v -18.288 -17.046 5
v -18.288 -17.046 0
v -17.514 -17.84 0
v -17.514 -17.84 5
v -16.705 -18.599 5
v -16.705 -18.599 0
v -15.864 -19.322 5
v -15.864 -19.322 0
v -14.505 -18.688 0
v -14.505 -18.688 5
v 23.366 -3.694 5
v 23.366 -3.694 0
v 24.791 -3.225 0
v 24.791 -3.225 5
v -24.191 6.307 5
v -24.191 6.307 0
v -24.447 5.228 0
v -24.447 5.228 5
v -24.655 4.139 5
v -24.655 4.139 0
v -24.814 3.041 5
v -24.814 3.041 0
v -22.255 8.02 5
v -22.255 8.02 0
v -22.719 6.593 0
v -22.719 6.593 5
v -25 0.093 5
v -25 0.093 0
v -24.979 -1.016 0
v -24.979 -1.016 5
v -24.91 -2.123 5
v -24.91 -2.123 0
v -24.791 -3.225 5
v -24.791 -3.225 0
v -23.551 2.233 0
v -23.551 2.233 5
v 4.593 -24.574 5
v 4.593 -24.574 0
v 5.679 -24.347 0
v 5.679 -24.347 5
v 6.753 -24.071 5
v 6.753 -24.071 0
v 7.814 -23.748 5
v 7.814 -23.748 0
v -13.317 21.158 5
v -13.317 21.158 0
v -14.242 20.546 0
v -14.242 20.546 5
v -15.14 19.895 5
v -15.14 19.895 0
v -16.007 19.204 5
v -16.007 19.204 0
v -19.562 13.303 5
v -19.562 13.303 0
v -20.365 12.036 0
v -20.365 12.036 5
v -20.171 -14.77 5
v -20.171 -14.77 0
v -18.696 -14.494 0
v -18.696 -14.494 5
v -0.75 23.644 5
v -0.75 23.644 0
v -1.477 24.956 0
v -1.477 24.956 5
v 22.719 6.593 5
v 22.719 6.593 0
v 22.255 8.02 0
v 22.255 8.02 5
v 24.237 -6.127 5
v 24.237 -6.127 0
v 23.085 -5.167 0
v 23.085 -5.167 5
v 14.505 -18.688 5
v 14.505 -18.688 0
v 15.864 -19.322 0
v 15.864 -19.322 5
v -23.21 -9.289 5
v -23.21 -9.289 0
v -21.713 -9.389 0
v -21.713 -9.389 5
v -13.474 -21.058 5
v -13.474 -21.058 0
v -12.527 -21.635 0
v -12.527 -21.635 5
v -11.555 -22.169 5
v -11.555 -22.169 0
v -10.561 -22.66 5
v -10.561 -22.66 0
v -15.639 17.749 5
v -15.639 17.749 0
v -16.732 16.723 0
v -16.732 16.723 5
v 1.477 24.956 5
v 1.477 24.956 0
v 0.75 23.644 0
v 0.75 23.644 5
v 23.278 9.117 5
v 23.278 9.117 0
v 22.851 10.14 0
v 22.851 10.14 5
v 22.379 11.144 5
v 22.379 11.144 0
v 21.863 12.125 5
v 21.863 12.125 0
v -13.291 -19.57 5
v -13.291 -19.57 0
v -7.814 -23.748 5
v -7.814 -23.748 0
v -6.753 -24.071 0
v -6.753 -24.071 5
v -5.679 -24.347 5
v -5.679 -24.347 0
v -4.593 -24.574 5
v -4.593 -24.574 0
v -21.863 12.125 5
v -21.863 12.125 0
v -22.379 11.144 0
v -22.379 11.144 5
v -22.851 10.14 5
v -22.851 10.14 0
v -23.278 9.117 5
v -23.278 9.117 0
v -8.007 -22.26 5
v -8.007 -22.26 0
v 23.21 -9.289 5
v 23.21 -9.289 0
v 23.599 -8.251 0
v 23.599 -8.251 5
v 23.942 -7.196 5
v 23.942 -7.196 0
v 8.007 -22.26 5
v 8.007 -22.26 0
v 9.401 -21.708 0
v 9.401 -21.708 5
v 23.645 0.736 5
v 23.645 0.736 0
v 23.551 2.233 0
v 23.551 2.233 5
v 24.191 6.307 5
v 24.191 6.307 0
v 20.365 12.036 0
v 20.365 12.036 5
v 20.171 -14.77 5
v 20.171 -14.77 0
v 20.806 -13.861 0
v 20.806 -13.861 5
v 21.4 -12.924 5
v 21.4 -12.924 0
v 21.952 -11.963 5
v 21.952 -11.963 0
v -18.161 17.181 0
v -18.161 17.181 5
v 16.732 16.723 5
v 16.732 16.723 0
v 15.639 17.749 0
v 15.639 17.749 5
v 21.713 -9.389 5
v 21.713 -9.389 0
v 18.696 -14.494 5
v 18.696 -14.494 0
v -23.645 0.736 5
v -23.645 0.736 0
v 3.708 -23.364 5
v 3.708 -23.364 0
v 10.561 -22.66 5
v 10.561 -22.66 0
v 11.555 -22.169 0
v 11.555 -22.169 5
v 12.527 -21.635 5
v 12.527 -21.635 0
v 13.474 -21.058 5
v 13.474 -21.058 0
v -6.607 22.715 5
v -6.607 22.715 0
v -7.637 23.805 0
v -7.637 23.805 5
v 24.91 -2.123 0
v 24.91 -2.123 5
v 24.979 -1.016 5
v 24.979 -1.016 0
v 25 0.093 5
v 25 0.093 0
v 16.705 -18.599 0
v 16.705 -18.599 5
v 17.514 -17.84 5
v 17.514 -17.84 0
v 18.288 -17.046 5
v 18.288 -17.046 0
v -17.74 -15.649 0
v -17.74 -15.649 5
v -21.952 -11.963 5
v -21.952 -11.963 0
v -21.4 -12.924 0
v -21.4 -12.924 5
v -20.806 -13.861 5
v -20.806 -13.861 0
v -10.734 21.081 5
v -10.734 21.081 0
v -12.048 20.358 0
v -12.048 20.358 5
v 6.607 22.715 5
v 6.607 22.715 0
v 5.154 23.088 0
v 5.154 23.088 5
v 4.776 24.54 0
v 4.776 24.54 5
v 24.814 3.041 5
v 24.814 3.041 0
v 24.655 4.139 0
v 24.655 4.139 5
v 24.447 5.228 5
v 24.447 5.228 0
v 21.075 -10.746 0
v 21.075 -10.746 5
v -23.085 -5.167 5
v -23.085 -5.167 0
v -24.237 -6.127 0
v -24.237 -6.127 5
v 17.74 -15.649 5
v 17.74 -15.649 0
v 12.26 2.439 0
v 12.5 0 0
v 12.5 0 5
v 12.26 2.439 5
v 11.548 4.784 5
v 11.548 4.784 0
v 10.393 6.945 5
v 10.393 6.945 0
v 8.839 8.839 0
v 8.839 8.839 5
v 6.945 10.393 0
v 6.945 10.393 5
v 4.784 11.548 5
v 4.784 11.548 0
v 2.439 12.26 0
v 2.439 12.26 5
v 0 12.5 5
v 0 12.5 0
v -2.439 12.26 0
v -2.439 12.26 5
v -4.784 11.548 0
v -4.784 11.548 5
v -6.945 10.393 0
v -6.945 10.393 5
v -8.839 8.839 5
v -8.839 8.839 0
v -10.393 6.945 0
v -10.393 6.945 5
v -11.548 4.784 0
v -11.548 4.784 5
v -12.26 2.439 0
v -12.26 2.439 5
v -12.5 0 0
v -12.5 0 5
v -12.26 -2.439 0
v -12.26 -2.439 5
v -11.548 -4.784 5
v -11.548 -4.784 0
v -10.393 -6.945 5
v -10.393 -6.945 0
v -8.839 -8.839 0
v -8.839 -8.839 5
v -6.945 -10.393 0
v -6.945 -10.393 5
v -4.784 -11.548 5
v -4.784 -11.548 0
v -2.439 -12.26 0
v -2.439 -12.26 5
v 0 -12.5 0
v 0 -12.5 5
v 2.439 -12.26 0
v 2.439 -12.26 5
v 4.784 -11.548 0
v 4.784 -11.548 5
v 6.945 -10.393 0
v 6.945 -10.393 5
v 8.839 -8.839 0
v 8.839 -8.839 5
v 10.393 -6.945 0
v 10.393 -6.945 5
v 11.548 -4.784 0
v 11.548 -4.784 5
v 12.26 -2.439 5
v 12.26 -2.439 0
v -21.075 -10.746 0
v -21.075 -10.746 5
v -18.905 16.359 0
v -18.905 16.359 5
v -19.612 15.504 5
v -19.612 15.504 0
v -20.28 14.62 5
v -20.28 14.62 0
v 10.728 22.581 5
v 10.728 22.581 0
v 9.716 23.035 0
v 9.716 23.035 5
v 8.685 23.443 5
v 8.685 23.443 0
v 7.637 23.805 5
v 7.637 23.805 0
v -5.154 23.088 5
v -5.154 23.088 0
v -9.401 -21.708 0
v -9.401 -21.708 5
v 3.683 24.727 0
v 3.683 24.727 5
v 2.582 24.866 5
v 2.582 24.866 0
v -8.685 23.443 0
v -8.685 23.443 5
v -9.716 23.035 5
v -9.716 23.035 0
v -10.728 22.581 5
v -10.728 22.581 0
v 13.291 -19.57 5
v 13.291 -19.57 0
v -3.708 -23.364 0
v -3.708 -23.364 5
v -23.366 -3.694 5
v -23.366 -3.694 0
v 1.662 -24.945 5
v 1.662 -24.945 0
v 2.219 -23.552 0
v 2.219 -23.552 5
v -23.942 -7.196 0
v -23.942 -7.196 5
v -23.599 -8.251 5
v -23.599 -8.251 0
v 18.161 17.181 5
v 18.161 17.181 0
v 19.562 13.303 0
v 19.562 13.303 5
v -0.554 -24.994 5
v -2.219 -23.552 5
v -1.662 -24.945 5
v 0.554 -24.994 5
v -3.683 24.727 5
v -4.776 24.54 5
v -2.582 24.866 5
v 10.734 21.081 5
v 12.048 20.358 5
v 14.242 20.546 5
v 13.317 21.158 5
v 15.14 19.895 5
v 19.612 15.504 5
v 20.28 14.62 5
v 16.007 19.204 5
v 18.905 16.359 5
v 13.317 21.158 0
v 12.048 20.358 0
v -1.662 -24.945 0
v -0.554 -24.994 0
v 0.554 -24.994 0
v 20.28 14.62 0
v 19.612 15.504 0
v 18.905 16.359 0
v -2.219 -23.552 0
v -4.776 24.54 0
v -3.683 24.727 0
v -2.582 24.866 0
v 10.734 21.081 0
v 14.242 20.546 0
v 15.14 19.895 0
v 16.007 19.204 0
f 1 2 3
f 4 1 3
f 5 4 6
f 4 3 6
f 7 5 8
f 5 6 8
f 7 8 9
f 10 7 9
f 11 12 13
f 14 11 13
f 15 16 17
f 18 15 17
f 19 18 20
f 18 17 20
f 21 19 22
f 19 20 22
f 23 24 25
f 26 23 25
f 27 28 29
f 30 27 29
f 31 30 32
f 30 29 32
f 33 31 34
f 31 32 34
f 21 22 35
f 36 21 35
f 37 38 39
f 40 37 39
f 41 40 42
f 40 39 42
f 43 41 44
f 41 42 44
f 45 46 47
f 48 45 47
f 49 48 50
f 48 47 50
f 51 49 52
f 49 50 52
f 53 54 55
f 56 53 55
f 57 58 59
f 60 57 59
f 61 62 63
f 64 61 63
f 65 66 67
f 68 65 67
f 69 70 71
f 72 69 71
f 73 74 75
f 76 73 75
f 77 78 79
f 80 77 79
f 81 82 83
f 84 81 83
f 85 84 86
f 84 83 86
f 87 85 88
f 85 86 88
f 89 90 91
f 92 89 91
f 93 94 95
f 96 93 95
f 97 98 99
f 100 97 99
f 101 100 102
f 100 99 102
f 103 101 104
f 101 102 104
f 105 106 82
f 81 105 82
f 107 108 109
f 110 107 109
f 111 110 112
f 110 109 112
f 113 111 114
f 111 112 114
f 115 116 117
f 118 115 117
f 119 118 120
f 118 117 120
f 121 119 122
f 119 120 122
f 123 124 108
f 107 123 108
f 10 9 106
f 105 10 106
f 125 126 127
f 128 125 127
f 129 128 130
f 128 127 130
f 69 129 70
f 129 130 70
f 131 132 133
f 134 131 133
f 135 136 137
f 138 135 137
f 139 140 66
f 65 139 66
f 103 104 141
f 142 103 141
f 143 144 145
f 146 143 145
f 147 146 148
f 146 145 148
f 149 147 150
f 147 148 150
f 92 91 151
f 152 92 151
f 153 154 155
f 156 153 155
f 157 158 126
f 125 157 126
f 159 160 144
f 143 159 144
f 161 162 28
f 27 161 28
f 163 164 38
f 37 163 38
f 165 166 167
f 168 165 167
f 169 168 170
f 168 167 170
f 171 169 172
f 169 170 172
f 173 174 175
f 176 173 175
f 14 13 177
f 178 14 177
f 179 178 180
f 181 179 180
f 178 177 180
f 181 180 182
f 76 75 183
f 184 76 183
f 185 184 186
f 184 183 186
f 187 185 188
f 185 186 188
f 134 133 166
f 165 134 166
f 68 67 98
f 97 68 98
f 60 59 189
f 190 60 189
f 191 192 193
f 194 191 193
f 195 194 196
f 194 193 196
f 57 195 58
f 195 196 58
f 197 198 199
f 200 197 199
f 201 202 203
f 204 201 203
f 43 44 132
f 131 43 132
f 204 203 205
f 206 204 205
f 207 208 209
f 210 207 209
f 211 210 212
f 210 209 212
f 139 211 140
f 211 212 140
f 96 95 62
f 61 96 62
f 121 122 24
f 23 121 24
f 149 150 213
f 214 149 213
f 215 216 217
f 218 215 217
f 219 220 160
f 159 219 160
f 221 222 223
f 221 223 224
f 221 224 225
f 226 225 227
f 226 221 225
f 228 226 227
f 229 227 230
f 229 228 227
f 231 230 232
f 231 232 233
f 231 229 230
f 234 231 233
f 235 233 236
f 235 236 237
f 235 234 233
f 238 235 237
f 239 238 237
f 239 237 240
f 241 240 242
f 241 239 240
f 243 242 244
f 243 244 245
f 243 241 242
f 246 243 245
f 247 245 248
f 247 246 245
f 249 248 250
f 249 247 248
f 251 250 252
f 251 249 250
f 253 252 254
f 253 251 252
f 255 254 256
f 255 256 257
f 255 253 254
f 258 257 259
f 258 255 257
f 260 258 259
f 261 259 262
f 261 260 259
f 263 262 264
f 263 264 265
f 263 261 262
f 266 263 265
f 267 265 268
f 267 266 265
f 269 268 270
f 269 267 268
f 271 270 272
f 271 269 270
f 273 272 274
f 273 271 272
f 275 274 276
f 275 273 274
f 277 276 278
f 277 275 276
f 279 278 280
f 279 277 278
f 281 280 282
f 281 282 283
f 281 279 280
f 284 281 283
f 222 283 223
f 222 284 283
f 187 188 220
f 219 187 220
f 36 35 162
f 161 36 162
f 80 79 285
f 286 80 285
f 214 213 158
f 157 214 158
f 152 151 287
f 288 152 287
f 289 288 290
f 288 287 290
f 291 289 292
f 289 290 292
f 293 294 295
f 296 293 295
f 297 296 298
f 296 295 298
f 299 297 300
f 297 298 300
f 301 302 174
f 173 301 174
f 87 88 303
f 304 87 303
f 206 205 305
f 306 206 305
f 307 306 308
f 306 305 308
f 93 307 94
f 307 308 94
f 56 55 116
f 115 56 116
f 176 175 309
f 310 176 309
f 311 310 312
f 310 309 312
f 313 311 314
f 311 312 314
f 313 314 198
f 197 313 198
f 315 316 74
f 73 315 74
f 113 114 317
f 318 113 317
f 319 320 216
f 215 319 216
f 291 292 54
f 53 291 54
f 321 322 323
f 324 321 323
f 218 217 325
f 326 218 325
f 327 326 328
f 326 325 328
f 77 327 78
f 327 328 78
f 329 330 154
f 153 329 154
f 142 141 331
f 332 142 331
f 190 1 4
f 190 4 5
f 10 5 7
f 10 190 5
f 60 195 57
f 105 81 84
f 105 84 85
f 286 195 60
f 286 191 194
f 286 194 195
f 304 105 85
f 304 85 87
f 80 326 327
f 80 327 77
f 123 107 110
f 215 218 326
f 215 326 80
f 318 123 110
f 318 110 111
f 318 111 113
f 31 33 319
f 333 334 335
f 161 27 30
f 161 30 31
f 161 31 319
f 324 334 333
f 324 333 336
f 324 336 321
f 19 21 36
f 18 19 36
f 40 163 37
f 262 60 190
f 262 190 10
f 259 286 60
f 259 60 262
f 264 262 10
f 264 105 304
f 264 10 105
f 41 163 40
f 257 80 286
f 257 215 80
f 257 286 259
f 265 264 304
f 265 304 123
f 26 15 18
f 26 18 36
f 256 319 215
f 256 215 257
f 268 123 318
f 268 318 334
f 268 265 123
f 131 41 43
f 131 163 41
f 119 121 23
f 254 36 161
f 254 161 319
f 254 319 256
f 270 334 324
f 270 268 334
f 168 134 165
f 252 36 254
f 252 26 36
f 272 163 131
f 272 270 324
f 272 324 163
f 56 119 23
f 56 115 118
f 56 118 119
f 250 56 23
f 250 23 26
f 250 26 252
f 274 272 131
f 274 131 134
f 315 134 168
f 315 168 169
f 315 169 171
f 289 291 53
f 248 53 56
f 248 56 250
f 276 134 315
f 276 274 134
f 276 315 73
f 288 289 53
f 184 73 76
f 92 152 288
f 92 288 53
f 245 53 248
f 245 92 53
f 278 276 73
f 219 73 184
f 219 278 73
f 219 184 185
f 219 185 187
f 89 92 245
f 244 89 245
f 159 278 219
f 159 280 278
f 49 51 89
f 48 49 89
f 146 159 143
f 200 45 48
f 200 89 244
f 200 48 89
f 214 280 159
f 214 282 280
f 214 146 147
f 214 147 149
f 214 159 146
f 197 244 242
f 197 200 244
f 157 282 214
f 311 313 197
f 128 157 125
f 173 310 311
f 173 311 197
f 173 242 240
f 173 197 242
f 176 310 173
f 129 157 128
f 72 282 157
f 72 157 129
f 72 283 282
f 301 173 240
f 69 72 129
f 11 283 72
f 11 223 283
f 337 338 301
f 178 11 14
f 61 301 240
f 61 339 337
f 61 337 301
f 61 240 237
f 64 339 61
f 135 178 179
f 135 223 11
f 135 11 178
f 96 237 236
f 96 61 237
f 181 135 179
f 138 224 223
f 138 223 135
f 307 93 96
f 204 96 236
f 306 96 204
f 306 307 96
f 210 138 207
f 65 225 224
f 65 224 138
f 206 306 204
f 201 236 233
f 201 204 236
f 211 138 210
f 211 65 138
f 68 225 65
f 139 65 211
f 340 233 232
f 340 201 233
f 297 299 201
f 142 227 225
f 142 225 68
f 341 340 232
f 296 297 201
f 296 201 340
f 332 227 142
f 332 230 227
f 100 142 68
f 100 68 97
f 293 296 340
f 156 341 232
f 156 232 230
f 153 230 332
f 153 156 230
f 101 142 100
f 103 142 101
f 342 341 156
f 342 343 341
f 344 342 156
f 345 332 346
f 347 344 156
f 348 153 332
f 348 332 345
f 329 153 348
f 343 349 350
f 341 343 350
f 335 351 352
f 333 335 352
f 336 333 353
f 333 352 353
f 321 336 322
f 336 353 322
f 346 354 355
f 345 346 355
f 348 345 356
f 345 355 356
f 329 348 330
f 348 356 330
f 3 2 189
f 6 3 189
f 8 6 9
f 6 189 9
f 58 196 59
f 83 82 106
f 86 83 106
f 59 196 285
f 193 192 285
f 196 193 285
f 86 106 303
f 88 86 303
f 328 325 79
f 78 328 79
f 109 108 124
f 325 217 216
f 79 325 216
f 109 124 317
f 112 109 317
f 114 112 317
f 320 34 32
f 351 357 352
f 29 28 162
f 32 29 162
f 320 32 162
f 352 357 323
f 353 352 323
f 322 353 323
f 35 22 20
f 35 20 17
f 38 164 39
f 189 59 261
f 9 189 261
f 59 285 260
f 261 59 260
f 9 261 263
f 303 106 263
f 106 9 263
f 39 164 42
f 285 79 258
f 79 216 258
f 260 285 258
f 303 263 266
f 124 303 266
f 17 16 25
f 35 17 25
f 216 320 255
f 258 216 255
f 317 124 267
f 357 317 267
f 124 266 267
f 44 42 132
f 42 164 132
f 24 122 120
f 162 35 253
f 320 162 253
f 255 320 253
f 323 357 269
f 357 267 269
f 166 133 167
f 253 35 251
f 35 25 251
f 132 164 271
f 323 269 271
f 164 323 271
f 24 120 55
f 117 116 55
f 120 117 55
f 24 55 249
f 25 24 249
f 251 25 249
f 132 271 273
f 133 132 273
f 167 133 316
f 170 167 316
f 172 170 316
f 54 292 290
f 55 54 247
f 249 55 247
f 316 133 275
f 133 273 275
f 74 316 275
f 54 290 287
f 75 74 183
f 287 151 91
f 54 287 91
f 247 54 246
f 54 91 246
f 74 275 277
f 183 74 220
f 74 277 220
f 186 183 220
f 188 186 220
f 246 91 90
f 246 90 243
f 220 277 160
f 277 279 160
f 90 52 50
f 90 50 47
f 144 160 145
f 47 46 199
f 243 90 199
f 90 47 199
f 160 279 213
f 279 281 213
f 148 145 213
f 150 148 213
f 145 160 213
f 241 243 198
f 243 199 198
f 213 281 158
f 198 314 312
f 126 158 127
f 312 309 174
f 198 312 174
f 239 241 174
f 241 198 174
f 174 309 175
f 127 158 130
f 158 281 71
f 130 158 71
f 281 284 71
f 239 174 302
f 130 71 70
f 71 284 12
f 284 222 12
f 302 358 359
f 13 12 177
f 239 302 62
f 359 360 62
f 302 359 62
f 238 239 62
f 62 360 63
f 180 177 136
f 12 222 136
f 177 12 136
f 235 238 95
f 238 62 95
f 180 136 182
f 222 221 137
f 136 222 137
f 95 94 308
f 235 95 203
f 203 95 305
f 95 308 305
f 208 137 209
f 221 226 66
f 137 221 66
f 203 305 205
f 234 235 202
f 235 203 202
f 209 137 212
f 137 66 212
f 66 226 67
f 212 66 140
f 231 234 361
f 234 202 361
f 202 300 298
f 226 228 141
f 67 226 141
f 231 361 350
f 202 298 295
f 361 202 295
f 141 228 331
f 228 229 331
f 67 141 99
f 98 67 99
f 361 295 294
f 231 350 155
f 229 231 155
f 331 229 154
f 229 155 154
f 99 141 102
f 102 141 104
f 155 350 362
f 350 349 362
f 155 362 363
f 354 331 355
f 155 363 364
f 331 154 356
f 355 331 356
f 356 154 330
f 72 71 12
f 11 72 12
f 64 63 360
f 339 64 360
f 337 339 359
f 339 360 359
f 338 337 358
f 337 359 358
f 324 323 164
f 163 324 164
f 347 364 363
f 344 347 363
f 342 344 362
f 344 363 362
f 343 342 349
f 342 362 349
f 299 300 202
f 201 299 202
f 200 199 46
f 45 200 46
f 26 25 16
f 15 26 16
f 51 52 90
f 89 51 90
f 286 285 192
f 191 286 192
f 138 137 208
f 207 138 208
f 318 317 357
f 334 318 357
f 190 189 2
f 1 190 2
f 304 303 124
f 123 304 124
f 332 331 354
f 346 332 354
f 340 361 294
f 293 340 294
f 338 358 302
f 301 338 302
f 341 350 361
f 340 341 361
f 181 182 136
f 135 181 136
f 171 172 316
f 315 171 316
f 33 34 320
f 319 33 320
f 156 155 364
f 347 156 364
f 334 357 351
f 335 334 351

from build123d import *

# Parameters (mm, degrees)
F0_R     = 12.5
F1_DEPTH = 5


with BuildPart() as f1:
    # F0 (on Top) → F1 (new body)
    with BuildSketch(Plane.XY):
        with BuildLine():
            Line((-6.606558, 22.71504), (-7.637189, 23.804902))
            ThreePointArc((-7.637189, 23.804902), (-9.203114, 23.244412), (-10.728305, 22.581042))
            Line((-10.728305, 22.581042), (-10.733541, 21.081051))
            Line((-10.733541, 21.081051), (-12.048001, 20.358421))
            Line((-12.048001, 20.358421), (-13.317291, 21.157735))
            ThreePointArc((-13.317291, 21.157735), (-14.694631, 20.225425), (-16.006933, 19.203596))
            Line((-16.006933, 19.203596), (-15.638972, 17.749428))
            Line((-15.638972, 17.749428), (-16.732425, 16.722607))
            Line((-16.732425, 16.722607), (-18.160619, 17.18115))
            ThreePointArc((-18.160619, 17.18115), (-19.262831, 15.9356), (-20.279786, 14.619518))
            Line((-20.279786, 14.619518), (-19.561748, 13.302543))
            Line((-19.561748, 13.302543), (-20.365488, 12.036051))
            Line((-20.365488, 12.036051), (-21.862848, 12.125011))
            ThreePointArc((-21.862848, 12.125011), (-22.620676, 10.644482), (-23.278385, 9.116841))
            Line((-23.278385, 9.116841), (-22.255388, 8.01981))
            Line((-22.255388, 8.01981), (-22.718913, 6.593226))
            Line((-22.718913, 6.593226), (-24.191354, 6.307012))
            ThreePointArc((-24.191354, 6.307012), (-24.557181, 4.684533), (-24.814318, 3.04132))
            Line((-24.814318, 3.04132), (-23.550639, 2.233164))
            Line((-23.550639, 2.233164), (-23.644825, 0.736123))
            Line((-23.644825, 0.736123), (-24.999828, 0.092721))
            ThreePointArc((-24.999828, 0.092721), (-24.950668, -1.569763), (-24.791076, -3.225299))
            Line((-24.791076, -3.225299), (-23.366118, -3.693801))
            Line((-23.366118, -3.693801), (-23.085046, -5.167232))
            Line((-23.085046, -5.167232), (-24.237471, -6.127397))
            ThreePointArc((-24.237471, -6.127397), (-23.776413, -7.725425), (-23.21012, -9.28926))
            Line((-23.21012, -9.28926), (-21.713417, -9.388671))
            Line((-21.713417, -9.388671), (-21.074748, -10.745911))
            Line((-21.074748, -10.745911), (-21.952185, -11.962507))
            ThreePointArc((-21.952185, -11.962507), (-21.108198, -13.39567), (-20.170786, -14.769543))
            Line((-20.170786, -14.769543), (-18.696383, -14.493616))
            Line((-18.696383, -14.493616), (-17.740247, -15.649386))
            Line((-17.740247, -15.649386), (-18.287562, -17.045969))
            ThreePointArc((-18.287562, -17.045969), (-17.113678, -18.224216), (-15.864048, -19.321801))
            Line((-15.864048, -19.321801), (-14.504586, -18.687874))
            Line((-14.504586, -18.687874), (-13.29106, -19.569551))
            Line((-13.29106, -19.569551), (-13.473864, -21.058371))
            ThreePointArc((-13.473864, -21.058371), (-12.043842, -21.907667), (-10.560513, -22.659999))
            Line((-10.560513, -22.659999), (-9.401412, -21.707904))
            Line((-9.401412, -21.707904), (-8.006748, -22.26009))
            Line((-8.006748, -22.26009), (-7.813554, -23.747597))
            ThreePointArc((-7.813554, -23.747597), (-6.217247, -24.214579), (-4.593422, -24.574387))
            Line((-4.593422, -24.574387), (-3.707514, -23.363946))
            Line((-3.707514, -23.363946), (-2.219342, -23.551946))
            Line((-2.219342, -23.551946), (-1.66229, -24.944675))
            ThreePointArc((-1.66229, -24.944675), (0, -25), (1.66229, -24.944675))
            Line((1.66229, -24.944675), (2.219342, -23.551946))
            Line((2.219342, -23.551946), (3.707514, -23.363946))
            Line((3.707514, -23.363946), (4.593422, -24.574387))
            ThreePointArc((4.593422, -24.574387), (6.217247, -24.214579), (7.813554, -23.747597))
            Line((7.813554, -23.747597), (8.006748, -22.26009))
            Line((8.006748, -22.26009), (9.401412, -21.707904))
            Line((9.401412, -21.707904), (10.560513, -22.659999))
            ThreePointArc((10.560513, -22.659999), (12.043842, -21.907667), (13.473864, -21.058371))
            Line((13.473864, -21.058371), (13.29106, -19.569551))
            Line((13.29106, -19.569551), (14.504586, -18.687874))
            Line((14.504586, -18.687874), (15.864048, -19.321801))
            ThreePointArc((15.864048, -19.321801), (17.113678, -18.224216), (18.287562, -17.045969))
            Line((18.287562, -17.045969), (17.740247, -15.649386))
            Line((17.740247, -15.649386), (18.696383, -14.493616))
            Line((18.696383, -14.493616), (20.170786, -14.769543))
            ThreePointArc((20.170786, -14.769543), (21.108198, -13.39567), (21.952185, -11.962507))
            Line((21.952185, -11.962507), (21.074748, -10.745911))
            Line((21.074748, -10.745911), (21.713417, -9.388671))
            Line((21.713417, -9.388671), (23.21012, -9.28926))
            ThreePointArc((23.21012, -9.28926), (23.776413, -7.725425), (24.237471, -6.127397))
            Line((24.237471, -6.127397), (23.085046, -5.167232))
            Line((23.085046, -5.167232), (23.366118, -3.693801))
            Line((23.366118, -3.693801), (24.791076, -3.225299))
            ThreePointArc((24.791076, -3.225299), (24.950668, -1.569763), (24.999828, 0.092721))
            Line((24.999828, 0.092721), (23.644825, 0.736123))
            Line((23.644825, 0.736123), (23.550639, 2.233164))
            Line((23.550639, 2.233164), (24.814318, 3.04132))
            ThreePointArc((24.814318, 3.04132), (24.557181, 4.684533), (24.191354, 6.307012))
            Line((24.191354, 6.307012), (22.718913, 6.593226))
            Line((22.718913, 6.593226), (22.255388, 8.01981))
            Line((22.255388, 8.01981), (23.278385, 9.116841))
            ThreePointArc((23.278385, 9.116841), (22.620676, 10.644482), (21.862848, 12.125011))
            Line((21.862848, 12.125011), (20.365488, 12.036051))
            Line((20.365488, 12.036051), (19.561748, 13.302543))
            Line((19.561748, 13.302543), (20.279786, 14.619518))
            ThreePointArc((20.279786, 14.619518), (19.262831, 15.9356), (18.160619, 17.18115))
            Line((18.160619, 17.18115), (16.732425, 16.722607))
            Line((16.732425, 16.722607), (15.638972, 17.749428))
            Line((15.638972, 17.749428), (16.006933, 19.203596))
            ThreePointArc((16.006933, 19.203596), (14.694631, 20.225425), (13.317291, 21.157735))
            Line((13.317291, 21.157735), (12.048001, 20.358421))
            Line((12.048001, 20.358421), (10.733541, 21.081051))
            Line((10.733541, 21.081051), (10.728305, 22.581042))
            ThreePointArc((10.728305, 22.581042), (9.203114, 23.244412), (7.637189, 23.804902))
            Line((7.637189, 23.804902), (6.606558, 22.71504))
            Line((6.606558, 22.71504), (5.153683, 23.088074))
            Line((5.153683, 23.088074), (4.775579, 24.539638))
            ThreePointArc((4.775579, 24.539638), (3.133331, 24.802868), (1.477214, 24.956319))
            Line((1.477214, 24.956319), (0.75, 23.644389))
            Line((0.75, 23.644389), (-0.75, 23.644389))
            Line((-0.75, 23.644389), (-1.477214, 24.956319))
            ThreePointArc((-1.477214, 24.956319), (-3.133331, 24.802868), (-4.775579, 24.539638))
            Line((-4.775579, 24.539638), (-5.153683, 23.088074))
            Line((-5.153683, 23.088074), (-6.606558, 22.71504))
        make_face()
        Circle(F0_R, mode=Mode.SUBTRACT)
    extrude(amount=F1_DEPTH)


solid = f1.part
